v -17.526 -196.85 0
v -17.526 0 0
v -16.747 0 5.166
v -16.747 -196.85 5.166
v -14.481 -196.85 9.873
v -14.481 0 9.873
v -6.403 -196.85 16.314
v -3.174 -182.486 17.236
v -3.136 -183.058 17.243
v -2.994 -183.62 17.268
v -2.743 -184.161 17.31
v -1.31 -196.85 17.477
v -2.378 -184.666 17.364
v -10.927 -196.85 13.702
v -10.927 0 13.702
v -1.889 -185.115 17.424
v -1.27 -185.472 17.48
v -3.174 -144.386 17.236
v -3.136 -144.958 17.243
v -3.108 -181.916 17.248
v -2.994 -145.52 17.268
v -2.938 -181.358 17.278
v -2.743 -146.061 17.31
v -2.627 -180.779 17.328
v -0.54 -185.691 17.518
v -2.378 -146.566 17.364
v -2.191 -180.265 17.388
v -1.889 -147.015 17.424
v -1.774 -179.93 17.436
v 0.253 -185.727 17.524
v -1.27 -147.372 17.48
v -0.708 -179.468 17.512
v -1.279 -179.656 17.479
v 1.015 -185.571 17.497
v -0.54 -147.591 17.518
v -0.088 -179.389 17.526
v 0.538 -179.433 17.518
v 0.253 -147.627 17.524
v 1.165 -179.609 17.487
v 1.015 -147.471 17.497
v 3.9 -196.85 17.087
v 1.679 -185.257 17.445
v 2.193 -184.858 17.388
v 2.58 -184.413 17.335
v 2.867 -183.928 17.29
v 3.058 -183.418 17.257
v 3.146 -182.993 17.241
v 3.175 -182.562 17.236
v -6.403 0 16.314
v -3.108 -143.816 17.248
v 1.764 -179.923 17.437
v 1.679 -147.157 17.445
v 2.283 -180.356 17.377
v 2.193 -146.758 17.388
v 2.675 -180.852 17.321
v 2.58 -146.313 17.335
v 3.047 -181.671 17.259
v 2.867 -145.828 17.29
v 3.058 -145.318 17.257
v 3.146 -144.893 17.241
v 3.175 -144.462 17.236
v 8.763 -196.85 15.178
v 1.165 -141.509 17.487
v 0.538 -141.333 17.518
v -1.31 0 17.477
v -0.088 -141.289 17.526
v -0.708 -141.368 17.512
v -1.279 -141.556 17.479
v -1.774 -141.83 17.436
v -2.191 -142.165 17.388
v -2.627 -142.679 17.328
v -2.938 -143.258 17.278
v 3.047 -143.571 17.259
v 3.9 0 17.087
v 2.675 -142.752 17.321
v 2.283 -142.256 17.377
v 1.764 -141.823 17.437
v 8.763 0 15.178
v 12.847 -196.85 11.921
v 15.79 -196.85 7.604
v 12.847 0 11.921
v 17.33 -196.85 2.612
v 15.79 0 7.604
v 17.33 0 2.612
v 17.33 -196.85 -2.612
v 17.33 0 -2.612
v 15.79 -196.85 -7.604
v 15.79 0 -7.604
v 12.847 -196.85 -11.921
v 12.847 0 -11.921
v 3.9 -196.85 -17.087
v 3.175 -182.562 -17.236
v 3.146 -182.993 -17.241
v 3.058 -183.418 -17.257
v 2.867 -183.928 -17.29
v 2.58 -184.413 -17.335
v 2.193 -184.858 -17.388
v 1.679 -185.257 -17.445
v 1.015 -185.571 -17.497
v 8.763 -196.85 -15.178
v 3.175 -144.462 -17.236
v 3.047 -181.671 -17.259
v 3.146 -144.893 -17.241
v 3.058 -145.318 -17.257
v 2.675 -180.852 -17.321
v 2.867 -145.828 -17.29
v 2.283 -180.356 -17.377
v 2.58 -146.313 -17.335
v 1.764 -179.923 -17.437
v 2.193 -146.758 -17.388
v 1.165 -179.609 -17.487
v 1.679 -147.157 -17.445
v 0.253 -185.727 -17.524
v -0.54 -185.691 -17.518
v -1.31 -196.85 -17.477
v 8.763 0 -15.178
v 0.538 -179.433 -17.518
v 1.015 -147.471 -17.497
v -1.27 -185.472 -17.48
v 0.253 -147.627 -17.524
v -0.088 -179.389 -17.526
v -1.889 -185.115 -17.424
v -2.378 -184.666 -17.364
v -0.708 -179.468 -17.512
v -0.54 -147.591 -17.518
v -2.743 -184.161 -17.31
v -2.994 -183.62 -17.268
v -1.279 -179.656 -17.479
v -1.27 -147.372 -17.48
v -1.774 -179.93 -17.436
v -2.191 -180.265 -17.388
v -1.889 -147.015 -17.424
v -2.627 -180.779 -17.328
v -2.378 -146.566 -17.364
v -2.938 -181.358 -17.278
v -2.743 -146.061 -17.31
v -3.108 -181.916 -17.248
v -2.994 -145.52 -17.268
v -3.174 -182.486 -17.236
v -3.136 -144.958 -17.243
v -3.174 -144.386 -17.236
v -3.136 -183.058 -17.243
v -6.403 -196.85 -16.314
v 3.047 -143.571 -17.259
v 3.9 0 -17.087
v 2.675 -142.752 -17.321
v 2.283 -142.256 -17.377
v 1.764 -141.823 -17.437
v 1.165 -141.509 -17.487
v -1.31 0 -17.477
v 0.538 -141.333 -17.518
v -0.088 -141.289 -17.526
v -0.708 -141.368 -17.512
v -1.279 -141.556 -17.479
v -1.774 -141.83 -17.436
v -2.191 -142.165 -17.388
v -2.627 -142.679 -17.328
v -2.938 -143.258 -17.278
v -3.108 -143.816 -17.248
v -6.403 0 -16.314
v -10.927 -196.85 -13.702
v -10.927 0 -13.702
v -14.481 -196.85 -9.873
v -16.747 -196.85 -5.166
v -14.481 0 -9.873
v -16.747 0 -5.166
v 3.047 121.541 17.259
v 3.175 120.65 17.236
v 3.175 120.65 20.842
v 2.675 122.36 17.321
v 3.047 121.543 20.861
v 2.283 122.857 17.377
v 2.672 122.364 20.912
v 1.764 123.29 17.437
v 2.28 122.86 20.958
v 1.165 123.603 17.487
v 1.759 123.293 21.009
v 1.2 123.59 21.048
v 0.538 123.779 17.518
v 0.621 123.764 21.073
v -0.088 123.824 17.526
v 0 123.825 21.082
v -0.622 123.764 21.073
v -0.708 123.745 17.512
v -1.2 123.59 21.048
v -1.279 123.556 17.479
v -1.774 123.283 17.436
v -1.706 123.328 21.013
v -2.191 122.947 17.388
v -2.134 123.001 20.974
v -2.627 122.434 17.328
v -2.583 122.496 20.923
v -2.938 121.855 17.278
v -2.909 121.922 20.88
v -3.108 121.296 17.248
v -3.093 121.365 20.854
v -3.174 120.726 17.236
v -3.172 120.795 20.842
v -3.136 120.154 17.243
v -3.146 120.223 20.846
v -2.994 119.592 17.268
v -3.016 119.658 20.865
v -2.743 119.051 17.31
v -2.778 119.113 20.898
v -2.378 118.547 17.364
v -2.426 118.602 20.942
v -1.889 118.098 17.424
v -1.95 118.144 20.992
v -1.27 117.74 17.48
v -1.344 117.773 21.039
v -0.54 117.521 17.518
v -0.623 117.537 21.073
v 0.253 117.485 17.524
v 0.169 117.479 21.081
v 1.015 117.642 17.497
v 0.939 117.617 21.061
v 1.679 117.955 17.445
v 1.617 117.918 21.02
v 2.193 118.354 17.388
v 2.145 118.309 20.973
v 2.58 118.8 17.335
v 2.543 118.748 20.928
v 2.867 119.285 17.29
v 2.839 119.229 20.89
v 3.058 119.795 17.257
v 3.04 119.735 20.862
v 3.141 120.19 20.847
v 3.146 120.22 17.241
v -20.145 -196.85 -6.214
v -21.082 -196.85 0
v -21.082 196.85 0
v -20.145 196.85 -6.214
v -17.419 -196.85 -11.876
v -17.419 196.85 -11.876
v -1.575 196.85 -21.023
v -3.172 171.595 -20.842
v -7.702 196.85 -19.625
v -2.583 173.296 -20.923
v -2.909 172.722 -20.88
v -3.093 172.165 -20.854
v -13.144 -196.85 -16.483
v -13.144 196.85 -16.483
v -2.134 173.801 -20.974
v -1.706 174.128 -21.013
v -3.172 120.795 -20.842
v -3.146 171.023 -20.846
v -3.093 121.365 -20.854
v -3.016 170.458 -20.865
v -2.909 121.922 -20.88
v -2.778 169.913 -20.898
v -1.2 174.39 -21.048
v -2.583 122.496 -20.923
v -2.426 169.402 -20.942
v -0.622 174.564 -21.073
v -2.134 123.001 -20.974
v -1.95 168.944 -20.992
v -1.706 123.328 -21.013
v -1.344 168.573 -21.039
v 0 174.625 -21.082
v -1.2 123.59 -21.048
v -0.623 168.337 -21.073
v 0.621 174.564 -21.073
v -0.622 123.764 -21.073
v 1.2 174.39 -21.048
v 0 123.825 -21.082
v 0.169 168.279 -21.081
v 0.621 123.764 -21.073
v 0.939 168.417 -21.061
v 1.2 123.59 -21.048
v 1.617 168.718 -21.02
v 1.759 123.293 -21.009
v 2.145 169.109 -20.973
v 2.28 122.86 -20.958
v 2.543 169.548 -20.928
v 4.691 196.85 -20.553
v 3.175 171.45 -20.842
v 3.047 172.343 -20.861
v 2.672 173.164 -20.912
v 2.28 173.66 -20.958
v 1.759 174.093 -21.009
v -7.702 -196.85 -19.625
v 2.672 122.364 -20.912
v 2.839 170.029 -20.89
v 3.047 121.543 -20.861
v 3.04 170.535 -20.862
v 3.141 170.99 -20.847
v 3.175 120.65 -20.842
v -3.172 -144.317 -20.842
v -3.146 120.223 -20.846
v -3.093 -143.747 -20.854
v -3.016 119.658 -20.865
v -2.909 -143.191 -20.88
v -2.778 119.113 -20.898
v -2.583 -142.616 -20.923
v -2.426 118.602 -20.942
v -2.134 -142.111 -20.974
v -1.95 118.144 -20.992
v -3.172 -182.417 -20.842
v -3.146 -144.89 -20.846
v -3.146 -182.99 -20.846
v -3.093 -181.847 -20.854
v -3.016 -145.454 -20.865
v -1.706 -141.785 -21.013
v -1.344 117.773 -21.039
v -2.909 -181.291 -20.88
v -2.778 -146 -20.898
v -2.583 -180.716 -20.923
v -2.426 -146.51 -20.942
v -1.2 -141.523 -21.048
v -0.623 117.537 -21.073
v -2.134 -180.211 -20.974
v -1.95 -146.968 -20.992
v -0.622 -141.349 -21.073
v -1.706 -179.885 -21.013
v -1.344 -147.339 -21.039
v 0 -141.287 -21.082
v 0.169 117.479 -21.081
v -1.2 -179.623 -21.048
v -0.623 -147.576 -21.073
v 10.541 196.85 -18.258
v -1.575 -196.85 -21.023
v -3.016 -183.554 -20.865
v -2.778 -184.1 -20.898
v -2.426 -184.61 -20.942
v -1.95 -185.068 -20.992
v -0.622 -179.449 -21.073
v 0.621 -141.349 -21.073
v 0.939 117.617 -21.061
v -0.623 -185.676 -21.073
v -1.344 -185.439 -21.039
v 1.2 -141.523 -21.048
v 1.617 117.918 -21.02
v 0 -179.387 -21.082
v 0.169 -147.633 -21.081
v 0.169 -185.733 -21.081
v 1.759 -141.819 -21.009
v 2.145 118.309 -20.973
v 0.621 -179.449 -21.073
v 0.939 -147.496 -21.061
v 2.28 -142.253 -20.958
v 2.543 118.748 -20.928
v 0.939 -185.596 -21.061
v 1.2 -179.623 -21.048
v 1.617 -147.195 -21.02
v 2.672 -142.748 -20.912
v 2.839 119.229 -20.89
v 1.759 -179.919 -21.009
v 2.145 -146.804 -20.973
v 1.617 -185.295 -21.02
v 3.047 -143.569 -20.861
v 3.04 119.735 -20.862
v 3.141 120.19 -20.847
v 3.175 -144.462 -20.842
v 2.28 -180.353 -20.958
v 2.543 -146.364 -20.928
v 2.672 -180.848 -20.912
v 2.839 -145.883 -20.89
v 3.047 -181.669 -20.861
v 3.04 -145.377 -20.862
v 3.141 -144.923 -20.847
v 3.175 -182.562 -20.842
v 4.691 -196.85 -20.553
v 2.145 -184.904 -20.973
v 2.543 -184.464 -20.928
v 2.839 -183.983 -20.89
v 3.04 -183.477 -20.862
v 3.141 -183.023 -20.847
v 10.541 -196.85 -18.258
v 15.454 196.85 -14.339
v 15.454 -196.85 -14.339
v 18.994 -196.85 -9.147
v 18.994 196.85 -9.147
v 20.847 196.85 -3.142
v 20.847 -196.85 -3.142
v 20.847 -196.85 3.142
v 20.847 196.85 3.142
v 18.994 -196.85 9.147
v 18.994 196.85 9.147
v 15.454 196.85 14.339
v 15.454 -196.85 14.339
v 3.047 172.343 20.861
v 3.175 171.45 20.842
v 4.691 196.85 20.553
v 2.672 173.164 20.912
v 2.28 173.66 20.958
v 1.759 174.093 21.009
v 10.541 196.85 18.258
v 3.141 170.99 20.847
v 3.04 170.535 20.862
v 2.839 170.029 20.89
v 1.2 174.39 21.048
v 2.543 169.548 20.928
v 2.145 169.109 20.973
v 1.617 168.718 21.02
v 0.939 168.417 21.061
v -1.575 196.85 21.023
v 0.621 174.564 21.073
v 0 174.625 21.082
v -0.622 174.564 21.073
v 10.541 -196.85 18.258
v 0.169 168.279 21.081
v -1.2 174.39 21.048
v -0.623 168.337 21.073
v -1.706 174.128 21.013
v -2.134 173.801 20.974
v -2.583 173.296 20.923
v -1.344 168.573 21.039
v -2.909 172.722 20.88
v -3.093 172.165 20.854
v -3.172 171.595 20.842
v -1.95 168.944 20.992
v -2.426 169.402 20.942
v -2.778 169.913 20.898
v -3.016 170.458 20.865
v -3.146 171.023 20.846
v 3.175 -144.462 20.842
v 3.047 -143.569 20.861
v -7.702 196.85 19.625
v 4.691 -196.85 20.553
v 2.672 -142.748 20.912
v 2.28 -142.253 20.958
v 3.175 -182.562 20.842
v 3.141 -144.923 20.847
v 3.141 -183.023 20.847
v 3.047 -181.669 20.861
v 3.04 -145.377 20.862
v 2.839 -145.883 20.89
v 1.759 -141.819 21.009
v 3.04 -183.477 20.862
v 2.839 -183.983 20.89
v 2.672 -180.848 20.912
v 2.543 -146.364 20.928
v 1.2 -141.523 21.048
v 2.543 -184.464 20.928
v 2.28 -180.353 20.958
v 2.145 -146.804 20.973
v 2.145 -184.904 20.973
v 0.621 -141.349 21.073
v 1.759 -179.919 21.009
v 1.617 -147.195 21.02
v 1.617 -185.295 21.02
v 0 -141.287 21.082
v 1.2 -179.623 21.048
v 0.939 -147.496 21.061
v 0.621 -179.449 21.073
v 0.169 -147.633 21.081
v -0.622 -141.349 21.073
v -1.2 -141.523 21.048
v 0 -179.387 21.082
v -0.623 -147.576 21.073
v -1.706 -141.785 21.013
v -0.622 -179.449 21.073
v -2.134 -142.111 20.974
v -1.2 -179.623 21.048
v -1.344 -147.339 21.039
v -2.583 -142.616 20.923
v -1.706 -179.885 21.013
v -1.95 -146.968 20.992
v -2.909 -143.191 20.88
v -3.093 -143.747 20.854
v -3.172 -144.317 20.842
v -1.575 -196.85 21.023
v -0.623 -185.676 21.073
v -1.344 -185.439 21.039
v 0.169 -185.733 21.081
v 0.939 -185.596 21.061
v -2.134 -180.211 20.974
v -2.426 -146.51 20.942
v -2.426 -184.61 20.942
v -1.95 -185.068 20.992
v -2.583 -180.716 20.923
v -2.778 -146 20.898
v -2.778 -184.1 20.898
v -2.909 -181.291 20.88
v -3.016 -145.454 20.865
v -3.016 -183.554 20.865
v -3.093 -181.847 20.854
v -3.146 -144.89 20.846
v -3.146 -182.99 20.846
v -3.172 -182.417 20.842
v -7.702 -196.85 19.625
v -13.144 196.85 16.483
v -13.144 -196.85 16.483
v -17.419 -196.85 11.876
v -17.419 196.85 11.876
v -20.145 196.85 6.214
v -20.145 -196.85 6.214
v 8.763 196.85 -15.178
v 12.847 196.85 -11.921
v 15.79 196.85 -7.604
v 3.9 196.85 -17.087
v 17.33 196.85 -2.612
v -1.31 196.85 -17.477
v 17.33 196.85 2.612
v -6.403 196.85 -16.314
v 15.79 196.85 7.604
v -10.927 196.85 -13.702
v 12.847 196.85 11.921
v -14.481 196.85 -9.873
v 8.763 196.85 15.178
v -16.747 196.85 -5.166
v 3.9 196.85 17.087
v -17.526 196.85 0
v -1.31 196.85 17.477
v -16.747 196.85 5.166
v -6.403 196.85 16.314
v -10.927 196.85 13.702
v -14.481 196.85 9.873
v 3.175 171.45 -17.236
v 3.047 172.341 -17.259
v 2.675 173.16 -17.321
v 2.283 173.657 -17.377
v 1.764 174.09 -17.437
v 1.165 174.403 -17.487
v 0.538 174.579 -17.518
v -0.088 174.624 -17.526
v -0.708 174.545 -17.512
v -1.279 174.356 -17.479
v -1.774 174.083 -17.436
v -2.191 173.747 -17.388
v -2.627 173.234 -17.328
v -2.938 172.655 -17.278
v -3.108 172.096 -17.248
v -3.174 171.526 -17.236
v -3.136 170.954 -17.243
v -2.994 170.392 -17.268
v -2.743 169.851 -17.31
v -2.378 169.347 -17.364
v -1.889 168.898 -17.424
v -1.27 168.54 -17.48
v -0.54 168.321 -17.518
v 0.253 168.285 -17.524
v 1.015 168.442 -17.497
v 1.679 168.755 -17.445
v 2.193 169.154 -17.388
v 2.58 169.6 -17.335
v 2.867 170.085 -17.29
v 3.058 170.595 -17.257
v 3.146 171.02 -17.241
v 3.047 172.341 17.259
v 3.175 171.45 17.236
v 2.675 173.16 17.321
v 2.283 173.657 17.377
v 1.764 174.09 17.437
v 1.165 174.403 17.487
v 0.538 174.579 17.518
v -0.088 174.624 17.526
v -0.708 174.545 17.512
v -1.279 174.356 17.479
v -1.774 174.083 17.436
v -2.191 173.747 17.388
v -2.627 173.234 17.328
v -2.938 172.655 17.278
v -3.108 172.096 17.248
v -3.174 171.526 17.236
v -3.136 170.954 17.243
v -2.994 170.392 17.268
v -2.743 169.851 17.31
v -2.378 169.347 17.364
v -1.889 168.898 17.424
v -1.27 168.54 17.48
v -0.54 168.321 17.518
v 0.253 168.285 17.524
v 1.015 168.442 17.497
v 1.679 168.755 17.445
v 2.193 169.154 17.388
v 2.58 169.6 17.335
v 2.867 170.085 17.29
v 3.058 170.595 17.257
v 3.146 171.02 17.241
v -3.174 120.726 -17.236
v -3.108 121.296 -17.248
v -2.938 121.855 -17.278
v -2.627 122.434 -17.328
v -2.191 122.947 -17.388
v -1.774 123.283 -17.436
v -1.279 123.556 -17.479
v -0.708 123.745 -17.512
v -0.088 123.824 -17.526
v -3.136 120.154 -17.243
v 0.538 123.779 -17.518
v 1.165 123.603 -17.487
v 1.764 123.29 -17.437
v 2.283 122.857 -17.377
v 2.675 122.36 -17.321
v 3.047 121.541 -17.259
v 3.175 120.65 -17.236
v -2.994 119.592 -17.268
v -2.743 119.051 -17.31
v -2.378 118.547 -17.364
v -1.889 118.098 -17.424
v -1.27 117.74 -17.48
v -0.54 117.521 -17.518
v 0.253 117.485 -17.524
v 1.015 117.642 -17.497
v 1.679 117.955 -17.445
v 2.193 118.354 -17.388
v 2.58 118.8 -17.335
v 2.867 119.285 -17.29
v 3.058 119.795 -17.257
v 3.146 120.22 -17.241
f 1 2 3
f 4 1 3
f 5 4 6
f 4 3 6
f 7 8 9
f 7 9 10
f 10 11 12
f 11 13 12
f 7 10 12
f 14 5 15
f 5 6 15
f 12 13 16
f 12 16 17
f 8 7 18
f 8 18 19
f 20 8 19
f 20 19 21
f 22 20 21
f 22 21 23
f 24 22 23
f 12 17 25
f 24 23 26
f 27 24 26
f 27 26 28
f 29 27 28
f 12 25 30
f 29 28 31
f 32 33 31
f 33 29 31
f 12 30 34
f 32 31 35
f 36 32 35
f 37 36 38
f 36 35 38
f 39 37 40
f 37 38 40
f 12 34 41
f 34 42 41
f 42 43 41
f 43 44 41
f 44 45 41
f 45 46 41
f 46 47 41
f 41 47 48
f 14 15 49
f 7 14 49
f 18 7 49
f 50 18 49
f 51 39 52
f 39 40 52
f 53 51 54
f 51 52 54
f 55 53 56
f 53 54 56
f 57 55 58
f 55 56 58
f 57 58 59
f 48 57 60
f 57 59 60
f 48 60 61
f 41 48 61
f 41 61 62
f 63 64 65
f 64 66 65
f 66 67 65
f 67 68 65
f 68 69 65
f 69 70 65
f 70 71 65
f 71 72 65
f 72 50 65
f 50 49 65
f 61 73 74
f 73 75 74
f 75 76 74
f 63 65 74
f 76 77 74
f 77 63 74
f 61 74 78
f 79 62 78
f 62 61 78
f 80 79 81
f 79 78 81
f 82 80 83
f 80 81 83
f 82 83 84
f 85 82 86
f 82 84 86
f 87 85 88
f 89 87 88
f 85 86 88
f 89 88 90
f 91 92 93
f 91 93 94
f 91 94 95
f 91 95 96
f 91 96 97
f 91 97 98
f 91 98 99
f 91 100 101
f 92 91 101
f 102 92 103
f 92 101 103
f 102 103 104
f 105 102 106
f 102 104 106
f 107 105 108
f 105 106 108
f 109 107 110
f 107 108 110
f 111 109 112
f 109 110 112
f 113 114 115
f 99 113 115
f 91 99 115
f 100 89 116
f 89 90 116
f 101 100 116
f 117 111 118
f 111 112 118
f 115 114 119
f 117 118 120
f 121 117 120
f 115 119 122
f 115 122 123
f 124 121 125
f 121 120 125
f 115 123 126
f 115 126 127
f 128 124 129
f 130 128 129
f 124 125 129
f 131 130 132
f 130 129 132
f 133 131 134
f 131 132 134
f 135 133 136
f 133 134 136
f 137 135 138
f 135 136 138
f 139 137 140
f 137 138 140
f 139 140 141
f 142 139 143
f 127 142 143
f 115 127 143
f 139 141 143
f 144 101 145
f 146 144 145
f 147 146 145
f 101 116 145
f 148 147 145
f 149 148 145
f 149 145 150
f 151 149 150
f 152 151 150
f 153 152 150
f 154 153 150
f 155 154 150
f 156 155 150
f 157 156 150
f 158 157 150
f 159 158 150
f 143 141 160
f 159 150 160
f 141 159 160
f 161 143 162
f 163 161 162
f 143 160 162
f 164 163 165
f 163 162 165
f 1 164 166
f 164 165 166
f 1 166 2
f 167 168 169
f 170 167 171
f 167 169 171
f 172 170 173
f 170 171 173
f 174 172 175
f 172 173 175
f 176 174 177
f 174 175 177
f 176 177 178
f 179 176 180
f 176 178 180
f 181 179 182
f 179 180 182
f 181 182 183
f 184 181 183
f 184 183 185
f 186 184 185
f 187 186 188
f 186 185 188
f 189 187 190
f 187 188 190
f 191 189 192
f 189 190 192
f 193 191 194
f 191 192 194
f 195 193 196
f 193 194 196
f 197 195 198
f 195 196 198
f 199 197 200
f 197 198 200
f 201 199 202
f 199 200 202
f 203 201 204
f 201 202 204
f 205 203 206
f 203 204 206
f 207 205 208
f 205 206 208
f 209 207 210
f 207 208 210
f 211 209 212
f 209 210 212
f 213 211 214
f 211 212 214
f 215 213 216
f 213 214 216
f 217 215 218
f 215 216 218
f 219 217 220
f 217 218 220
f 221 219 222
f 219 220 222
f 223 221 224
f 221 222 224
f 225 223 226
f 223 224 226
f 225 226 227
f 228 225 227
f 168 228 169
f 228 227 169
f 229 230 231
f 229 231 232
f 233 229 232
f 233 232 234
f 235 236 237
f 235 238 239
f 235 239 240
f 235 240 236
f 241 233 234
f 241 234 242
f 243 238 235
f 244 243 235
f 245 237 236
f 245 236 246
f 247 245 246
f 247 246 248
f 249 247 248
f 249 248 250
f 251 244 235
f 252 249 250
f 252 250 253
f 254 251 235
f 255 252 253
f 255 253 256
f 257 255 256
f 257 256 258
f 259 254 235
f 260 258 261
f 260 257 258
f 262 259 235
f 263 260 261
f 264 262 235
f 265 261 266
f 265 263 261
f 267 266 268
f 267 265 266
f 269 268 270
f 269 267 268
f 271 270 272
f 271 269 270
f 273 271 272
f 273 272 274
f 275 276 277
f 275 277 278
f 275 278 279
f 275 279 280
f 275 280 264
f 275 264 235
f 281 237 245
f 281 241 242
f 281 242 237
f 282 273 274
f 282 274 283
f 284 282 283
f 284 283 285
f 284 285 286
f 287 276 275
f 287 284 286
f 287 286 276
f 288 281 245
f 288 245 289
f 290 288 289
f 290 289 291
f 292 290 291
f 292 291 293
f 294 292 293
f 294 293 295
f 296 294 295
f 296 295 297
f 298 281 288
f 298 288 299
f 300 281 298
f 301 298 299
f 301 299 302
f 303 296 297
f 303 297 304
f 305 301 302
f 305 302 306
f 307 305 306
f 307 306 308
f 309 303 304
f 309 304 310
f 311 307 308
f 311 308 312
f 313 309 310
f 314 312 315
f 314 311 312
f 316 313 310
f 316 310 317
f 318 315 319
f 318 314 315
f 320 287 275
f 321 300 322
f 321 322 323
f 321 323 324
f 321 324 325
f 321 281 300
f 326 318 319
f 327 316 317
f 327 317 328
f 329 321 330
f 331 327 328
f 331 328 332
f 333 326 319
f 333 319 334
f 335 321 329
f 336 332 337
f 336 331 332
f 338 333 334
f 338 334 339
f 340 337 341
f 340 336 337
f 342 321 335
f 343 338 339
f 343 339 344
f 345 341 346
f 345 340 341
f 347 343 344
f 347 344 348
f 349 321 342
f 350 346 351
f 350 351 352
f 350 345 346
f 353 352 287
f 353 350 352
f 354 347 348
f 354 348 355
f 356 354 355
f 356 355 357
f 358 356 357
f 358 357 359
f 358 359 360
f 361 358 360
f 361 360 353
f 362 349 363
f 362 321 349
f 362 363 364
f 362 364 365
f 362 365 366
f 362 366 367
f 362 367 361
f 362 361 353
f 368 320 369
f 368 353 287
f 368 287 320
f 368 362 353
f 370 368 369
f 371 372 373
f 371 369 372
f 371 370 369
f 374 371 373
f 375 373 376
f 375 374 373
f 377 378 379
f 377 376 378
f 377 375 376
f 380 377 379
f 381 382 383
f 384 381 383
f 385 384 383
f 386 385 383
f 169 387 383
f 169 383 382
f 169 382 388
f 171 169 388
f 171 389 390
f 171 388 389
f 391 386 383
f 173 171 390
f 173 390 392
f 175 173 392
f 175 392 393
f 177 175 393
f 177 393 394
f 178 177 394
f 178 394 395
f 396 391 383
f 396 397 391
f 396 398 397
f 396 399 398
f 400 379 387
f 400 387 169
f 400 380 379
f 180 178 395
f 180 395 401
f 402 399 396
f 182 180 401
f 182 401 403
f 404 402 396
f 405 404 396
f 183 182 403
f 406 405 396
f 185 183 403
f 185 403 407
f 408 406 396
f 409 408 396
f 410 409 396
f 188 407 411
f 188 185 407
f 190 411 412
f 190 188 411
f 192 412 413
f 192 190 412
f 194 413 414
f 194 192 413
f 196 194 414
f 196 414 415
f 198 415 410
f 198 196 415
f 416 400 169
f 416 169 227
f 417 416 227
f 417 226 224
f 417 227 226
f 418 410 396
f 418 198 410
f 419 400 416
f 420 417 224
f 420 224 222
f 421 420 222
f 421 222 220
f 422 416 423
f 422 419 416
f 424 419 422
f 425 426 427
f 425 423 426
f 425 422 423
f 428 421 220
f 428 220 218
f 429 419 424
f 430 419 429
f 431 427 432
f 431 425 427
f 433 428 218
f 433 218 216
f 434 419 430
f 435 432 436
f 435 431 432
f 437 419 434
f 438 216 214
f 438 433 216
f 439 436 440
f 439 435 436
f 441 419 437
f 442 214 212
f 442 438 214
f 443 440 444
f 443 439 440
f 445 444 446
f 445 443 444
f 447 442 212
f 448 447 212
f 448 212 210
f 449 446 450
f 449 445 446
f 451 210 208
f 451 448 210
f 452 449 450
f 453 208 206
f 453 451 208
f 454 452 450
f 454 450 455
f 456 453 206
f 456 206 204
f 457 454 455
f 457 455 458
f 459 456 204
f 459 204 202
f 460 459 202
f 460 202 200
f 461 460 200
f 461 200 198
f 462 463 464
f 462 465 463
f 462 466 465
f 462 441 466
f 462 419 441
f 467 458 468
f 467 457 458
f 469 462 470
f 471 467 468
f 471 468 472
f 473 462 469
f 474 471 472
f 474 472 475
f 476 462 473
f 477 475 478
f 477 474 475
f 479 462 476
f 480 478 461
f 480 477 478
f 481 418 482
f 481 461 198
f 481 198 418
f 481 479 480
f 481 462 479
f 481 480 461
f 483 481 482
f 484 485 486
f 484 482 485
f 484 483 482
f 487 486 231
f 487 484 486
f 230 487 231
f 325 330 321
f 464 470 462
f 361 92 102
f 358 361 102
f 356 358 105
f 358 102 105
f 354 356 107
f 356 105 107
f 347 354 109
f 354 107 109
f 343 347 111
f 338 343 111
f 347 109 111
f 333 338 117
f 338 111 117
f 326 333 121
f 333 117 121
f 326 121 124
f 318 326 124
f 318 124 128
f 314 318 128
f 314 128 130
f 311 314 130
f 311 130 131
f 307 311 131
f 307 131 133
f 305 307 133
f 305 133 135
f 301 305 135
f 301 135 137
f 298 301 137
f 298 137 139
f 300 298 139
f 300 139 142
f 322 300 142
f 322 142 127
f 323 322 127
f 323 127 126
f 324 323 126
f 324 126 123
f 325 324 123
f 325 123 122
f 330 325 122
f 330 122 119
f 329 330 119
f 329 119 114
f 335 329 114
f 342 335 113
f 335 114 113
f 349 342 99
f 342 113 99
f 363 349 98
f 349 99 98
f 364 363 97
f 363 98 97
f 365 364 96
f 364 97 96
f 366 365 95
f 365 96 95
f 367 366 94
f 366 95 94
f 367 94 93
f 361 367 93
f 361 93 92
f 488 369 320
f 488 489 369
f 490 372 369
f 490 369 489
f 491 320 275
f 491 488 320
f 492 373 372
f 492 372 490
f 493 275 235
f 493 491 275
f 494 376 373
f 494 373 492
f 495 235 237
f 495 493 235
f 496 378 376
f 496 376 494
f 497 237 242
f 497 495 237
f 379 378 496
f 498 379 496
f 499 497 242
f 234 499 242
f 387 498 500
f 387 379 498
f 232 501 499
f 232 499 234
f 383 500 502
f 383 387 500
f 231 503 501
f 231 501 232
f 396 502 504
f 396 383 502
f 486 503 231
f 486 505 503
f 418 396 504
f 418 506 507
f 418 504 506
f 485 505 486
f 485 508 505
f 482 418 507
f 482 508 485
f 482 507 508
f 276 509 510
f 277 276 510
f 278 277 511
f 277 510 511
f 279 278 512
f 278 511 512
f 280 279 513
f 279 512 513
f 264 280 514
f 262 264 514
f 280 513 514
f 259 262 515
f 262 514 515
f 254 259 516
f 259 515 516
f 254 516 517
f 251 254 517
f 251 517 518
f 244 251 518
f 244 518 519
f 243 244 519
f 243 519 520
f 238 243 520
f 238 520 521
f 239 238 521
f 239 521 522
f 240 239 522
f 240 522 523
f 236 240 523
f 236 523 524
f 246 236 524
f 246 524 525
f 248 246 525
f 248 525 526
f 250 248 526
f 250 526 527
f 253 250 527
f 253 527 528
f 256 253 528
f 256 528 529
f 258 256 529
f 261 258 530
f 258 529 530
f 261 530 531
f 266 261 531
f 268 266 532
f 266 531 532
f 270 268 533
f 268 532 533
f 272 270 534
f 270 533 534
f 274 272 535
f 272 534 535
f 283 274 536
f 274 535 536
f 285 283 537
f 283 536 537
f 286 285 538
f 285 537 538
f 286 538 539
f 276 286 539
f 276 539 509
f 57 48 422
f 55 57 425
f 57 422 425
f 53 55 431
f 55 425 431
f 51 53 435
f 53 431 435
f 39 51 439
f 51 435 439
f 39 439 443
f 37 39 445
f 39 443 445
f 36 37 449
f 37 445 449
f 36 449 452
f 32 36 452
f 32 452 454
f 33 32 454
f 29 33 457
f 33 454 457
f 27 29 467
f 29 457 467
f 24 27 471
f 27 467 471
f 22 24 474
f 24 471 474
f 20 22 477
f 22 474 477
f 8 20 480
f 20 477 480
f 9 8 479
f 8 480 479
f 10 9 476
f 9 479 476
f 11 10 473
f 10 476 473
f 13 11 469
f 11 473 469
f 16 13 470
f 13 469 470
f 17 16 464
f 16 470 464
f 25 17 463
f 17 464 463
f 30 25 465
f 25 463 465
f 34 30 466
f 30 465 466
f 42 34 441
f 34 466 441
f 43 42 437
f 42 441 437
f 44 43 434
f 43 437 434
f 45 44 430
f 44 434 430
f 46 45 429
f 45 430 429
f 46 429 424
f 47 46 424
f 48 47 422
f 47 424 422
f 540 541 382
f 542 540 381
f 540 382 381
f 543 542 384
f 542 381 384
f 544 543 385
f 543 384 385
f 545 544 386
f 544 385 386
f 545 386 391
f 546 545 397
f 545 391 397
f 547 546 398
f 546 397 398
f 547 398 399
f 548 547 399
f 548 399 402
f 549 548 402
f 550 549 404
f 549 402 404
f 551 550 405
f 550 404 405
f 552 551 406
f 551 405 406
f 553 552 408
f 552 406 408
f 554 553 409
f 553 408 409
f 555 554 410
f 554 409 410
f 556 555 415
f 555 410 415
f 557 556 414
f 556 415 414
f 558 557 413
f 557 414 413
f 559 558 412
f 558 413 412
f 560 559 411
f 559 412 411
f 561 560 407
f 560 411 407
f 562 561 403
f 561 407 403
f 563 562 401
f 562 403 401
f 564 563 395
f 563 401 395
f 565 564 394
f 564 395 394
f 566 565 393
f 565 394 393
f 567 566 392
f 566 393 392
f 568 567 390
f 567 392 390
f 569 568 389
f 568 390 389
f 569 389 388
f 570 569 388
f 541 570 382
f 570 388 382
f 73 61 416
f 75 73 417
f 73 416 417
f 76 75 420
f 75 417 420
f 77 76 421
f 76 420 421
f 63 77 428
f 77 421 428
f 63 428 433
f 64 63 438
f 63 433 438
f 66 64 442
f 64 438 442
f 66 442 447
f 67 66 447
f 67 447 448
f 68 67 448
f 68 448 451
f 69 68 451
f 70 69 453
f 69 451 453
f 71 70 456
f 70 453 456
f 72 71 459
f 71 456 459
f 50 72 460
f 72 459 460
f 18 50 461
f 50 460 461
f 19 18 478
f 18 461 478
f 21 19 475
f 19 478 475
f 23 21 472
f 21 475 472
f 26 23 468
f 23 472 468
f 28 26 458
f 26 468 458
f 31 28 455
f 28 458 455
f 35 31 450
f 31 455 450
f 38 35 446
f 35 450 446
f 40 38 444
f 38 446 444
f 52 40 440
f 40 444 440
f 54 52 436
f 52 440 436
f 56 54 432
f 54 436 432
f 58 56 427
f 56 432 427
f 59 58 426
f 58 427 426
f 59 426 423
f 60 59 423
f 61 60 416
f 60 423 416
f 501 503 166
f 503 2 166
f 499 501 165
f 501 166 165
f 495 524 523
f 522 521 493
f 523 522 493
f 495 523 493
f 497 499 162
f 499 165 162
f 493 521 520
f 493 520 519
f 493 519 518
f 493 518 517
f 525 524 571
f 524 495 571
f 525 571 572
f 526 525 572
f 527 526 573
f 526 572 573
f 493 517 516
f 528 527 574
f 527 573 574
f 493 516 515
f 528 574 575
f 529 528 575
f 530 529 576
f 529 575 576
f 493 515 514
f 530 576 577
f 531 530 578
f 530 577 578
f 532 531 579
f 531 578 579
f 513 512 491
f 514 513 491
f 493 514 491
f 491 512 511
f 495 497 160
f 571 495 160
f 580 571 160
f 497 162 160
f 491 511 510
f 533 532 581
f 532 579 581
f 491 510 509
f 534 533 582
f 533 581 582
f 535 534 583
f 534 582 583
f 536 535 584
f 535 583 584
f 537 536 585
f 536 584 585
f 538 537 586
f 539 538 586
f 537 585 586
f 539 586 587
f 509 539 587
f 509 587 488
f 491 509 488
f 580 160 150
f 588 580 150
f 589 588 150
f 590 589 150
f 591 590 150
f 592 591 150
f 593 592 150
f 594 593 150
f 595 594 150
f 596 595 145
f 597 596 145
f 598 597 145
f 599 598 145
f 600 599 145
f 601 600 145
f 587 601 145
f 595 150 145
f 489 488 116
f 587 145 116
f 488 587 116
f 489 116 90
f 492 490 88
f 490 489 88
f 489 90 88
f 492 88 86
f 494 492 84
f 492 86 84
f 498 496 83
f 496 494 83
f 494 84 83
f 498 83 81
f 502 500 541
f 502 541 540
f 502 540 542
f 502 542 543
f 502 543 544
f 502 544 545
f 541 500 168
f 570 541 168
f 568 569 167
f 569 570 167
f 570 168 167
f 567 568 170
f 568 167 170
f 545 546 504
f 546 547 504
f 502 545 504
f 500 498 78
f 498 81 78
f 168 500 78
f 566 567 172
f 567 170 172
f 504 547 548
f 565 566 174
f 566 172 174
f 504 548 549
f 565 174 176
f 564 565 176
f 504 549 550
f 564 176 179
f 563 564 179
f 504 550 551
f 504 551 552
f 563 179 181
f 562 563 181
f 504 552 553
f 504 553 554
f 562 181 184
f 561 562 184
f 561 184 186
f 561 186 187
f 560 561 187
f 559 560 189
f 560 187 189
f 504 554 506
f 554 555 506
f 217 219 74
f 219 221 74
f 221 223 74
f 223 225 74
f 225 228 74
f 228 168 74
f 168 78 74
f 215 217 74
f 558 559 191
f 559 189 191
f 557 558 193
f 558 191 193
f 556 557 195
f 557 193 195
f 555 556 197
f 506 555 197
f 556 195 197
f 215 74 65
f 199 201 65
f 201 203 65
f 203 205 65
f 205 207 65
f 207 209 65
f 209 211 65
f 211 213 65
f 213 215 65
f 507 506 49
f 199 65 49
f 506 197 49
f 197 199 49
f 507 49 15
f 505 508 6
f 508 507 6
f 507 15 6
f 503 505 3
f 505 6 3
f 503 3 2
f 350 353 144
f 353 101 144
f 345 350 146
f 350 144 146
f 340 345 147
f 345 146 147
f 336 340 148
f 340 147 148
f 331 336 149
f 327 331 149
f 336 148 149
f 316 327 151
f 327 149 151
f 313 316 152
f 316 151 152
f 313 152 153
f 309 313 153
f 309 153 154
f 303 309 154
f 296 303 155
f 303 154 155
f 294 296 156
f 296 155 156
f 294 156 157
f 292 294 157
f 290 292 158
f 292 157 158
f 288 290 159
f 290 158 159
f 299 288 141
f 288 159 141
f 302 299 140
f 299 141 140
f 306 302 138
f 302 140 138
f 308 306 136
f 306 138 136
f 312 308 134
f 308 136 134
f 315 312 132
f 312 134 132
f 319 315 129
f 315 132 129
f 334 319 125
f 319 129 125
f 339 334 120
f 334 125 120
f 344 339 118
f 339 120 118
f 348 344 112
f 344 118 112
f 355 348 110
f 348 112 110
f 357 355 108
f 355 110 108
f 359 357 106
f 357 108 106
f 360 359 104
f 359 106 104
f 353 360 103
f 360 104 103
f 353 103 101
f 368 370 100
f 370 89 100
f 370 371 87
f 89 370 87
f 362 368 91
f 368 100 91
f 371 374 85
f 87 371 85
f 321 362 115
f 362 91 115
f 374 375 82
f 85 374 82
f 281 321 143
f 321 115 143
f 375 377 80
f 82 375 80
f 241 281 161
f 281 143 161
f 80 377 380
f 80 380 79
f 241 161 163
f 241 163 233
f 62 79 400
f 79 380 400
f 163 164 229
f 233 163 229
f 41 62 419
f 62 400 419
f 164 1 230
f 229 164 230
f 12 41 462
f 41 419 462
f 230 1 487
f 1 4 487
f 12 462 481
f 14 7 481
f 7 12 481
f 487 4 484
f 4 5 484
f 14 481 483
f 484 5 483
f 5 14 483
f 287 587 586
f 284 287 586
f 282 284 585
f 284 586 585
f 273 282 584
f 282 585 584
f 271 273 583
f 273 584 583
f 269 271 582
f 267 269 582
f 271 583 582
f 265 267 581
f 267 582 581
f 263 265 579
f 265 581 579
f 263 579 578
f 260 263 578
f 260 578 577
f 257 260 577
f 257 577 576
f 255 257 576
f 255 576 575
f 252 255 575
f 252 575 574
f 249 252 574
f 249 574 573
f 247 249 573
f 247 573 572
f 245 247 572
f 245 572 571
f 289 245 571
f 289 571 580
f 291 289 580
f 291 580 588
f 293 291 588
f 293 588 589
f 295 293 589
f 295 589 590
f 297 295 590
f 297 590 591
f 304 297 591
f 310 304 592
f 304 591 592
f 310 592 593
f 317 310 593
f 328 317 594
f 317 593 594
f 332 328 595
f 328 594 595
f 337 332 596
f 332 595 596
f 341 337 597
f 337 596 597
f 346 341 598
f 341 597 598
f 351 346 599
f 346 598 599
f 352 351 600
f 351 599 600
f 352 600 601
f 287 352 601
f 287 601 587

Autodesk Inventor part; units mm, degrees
ref_plane "YZ Plane" through (0, 0, 0) normal (1, 0, 0) x (0, 1, 0)
ref_plane "XZ Plane" through (0, 0, 0) normal (0, 1, 0) x (-1, 0, 0)
ref_plane "XY Plane" through (0, 0, 0) normal (0, 0, 1) x (1, 0, 0)
sketch "Sketch1" plane through (0, 0, 0) normal (0, 1, 0) x (-1, 0, 0)
  circle A0 centre (0, 0) radius 21.082
  circle A1 centre (0, 0) radius 17.526
  dimension "d0" = 42.164
  dimension "d1" = 35.052
extrude "Extrusion1" add sketch "Sketch1" along normal mid plane 393.7
sketch "Sketch3" plane through (0, 0, 0) normal (0, 0, 1) x (1, 0, 0)
  circle A0 centre (0, 171.45) radius 3.175
  circle A1 centre (0, 120.65) radius 3.175
  line L0 (21.082, 196.85) -> (-21.082, 196.85) projected
  circle A2 centre (0, -182.5625) radius 3.175
  circle A3 centre (0, -144.4625) radius 3.175
  line L1 (-21.082, -196.85) -> (21.082, -196.85) projected
  point P0 (0, 0)
  dimension "d10" = 25.4
  dimension "d11" = 76.2
  dimension "d12" = 6.35
  dimension "d15" = 38.1
  dimension "d16" = 14.2875
extrude "Extrusion3" cut sketch "Sketch3" against normal through all both and the other way through all
properties part number "FE-120-002 Top Connector Bar" material "Aluminum 6061"
